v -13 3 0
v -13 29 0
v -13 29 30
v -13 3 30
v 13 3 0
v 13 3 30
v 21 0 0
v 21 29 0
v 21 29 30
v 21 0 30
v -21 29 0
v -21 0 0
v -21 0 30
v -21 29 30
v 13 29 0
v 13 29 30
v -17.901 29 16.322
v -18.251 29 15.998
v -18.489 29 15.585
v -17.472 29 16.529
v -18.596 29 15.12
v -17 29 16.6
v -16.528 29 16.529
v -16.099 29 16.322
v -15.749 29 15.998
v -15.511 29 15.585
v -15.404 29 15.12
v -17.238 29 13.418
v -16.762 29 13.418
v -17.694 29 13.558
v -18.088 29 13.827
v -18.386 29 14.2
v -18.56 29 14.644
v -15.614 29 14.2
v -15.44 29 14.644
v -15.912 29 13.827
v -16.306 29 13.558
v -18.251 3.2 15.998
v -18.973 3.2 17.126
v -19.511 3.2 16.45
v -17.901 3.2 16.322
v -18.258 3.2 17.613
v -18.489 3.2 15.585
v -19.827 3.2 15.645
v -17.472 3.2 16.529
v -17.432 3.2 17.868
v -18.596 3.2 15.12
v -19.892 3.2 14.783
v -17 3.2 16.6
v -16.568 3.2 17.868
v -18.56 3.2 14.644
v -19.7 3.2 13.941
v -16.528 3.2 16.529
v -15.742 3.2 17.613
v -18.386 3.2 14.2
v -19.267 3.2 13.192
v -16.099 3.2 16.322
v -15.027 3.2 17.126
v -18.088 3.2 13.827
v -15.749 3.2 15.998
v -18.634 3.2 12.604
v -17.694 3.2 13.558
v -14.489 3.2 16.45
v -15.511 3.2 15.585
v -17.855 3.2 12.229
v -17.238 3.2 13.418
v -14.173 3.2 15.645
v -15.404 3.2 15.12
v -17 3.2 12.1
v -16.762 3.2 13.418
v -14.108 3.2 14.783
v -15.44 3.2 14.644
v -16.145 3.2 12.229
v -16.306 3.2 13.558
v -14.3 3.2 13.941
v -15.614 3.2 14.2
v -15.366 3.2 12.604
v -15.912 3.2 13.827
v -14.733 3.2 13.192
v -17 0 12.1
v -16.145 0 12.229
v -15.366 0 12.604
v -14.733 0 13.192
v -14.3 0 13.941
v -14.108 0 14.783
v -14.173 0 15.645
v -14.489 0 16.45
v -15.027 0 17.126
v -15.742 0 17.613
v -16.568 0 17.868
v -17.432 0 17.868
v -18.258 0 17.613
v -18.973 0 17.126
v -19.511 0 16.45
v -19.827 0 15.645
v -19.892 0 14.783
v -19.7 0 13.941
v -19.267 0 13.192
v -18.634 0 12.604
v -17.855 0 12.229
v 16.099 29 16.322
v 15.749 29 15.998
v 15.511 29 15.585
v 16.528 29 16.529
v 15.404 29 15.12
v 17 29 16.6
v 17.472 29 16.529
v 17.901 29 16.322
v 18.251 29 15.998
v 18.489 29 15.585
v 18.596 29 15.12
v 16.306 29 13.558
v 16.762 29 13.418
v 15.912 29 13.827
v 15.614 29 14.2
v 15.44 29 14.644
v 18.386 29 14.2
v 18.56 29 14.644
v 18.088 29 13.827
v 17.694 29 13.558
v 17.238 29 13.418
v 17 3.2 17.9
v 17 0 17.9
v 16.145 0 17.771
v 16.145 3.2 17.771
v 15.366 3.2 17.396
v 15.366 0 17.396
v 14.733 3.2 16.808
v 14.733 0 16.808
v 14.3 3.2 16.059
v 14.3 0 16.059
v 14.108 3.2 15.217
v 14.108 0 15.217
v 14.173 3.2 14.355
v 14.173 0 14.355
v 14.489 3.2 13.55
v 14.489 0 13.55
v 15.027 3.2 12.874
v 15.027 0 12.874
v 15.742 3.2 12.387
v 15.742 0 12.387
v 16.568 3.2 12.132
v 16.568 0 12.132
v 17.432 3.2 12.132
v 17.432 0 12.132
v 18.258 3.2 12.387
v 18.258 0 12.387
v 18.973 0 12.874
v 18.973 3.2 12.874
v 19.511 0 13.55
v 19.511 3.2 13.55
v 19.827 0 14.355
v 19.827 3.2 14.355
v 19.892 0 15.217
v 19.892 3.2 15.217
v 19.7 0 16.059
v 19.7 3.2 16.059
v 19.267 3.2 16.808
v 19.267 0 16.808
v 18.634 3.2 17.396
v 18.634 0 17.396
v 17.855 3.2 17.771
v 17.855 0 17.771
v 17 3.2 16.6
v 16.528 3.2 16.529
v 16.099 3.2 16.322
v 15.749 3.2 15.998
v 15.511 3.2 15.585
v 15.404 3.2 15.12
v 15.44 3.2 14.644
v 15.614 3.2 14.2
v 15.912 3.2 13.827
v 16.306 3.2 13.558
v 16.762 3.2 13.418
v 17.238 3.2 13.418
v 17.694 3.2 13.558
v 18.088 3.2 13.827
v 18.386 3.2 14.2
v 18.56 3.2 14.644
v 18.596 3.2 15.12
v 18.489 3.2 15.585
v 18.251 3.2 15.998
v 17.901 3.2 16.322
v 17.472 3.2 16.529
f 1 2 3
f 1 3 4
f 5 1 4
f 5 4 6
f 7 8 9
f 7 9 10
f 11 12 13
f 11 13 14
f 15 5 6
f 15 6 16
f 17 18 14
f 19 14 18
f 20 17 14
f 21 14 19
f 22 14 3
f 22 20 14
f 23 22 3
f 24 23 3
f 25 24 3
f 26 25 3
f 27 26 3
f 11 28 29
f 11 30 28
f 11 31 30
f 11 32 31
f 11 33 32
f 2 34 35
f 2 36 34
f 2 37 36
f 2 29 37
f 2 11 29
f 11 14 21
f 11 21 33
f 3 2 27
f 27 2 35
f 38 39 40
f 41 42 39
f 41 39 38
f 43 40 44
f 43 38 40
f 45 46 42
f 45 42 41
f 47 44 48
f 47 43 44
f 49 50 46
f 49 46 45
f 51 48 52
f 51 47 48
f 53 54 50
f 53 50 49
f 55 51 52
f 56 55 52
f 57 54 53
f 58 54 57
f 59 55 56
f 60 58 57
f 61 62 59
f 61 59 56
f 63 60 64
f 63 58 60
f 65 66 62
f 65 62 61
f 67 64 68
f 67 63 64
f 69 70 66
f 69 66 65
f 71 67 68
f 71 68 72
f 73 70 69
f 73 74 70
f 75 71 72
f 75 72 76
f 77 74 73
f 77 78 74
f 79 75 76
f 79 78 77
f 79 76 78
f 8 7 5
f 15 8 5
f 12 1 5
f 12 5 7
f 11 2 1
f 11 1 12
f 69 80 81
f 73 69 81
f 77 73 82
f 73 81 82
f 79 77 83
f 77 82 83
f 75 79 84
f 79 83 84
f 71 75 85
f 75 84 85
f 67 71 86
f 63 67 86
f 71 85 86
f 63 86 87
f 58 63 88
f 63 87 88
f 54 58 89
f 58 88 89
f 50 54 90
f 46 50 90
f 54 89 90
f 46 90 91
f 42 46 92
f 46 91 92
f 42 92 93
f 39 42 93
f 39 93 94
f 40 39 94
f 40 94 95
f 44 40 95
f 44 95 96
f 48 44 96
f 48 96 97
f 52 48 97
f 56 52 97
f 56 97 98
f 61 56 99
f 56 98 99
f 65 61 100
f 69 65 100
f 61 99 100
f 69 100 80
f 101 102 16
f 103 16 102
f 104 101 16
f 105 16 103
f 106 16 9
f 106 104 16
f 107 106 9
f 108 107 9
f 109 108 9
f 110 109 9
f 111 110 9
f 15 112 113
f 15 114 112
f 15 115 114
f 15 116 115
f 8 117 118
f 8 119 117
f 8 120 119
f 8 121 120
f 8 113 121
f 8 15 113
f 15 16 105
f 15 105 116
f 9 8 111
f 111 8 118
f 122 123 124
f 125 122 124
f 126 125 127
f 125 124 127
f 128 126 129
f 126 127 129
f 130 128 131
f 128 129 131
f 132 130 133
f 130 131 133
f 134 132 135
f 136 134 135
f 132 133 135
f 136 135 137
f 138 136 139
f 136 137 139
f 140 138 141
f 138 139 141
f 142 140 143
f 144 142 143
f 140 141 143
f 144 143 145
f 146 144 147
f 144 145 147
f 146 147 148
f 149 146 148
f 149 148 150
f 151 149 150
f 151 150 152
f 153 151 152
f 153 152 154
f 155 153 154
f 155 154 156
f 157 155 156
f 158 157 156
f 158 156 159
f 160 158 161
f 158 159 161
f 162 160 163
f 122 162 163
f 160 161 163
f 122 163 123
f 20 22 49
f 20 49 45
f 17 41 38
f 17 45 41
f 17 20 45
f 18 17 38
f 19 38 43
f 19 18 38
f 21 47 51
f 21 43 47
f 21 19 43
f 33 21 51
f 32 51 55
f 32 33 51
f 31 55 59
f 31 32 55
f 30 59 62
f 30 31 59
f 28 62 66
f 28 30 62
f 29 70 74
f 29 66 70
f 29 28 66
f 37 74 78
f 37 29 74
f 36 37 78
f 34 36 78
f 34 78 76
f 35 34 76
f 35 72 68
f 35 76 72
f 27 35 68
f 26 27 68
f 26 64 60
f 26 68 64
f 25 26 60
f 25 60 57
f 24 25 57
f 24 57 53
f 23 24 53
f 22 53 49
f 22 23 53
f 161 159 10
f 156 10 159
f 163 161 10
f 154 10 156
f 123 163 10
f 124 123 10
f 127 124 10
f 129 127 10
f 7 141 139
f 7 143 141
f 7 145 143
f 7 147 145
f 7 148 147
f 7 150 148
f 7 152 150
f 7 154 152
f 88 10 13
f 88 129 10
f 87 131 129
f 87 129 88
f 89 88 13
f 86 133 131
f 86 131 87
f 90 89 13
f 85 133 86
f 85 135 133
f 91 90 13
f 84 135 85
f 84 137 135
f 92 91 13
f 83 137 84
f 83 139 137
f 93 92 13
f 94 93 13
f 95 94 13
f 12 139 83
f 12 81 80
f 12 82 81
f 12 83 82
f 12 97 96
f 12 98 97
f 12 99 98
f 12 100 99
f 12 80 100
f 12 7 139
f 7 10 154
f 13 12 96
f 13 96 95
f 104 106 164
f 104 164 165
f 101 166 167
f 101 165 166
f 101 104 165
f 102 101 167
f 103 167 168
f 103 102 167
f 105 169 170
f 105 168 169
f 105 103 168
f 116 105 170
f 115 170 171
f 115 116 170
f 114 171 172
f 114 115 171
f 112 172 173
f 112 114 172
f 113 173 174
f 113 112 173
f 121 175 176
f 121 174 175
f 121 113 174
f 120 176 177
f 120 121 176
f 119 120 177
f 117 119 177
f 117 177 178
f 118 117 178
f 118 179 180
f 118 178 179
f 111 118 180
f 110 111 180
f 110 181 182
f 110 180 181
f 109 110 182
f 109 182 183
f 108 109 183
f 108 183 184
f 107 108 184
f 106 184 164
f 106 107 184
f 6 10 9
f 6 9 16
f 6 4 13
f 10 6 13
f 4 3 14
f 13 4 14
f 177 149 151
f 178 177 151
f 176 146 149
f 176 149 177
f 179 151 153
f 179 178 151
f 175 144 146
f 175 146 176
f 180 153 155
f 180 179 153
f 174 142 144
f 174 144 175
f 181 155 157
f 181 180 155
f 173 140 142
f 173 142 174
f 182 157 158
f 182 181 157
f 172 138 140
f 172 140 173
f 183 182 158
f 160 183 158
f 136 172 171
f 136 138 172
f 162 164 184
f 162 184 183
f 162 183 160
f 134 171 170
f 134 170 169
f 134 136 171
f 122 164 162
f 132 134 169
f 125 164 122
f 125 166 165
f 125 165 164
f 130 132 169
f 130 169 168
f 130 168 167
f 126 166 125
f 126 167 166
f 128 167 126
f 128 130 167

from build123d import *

# Parameters (mm, degrees)
SALIENTE_EXTRUIR1_DEPTH    = 30
CORTAR_EXTRUIR1_DEPTH      = 15
CORTAR_EXTRUIR1_DEPTH_BACK = 41
CROQUIS2_R                 = 1.6
CROQUIS3_R                 = 2.9
CORTAR_EXTRUIR2_DEPTH      = 3.2


with BuildPart() as part:
    # Croquis1 → Saliente-Extruir1 (new body)
    with BuildSketch(Plane.XY):
        Polygon((-21, 0), (-21, 29), (-13, 29), (-13, 3), (13, 3), (13, 29), (21, 29), (21, 0), align=None)
    extrude(amount=SALIENTE_EXTRUIR1_DEPTH)

    # Croquis2 → Cortar-Extruir1 (cut, two sides: drawn at the far end of the back side and taken through both)
    with BuildSketch(Plane.XZ.offset(-CORTAR_EXTRUIR1_DEPTH_BACK)):
        with Locations(Location((-17, 15, 0), (0, 0, 90))):
            Circle(CROQUIS2_R)
        with Locations(Location((17, 15, 0), (0, 0, 90))):
            Circle(CROQUIS2_R)
    extrude(amount=CORTAR_EXTRUIR1_DEPTH + CORTAR_EXTRUIR1_DEPTH_BACK, mode=Mode.SUBTRACT)

    # Croquis3 → Cortar-Extruir2 (cut)
    with BuildSketch(Plane.XZ):
        with Locations(Location((-17, 15, 0), (0, 0, 270))):
            Circle(CROQUIS3_R)
        with Locations(Location((17, 15, 0), (0, 0, 90))):
            Circle(CROQUIS3_R)
    extrude(amount=-CORTAR_EXTRUIR2_DEPTH, mode=Mode.SUBTRACT)


solid = part.part
